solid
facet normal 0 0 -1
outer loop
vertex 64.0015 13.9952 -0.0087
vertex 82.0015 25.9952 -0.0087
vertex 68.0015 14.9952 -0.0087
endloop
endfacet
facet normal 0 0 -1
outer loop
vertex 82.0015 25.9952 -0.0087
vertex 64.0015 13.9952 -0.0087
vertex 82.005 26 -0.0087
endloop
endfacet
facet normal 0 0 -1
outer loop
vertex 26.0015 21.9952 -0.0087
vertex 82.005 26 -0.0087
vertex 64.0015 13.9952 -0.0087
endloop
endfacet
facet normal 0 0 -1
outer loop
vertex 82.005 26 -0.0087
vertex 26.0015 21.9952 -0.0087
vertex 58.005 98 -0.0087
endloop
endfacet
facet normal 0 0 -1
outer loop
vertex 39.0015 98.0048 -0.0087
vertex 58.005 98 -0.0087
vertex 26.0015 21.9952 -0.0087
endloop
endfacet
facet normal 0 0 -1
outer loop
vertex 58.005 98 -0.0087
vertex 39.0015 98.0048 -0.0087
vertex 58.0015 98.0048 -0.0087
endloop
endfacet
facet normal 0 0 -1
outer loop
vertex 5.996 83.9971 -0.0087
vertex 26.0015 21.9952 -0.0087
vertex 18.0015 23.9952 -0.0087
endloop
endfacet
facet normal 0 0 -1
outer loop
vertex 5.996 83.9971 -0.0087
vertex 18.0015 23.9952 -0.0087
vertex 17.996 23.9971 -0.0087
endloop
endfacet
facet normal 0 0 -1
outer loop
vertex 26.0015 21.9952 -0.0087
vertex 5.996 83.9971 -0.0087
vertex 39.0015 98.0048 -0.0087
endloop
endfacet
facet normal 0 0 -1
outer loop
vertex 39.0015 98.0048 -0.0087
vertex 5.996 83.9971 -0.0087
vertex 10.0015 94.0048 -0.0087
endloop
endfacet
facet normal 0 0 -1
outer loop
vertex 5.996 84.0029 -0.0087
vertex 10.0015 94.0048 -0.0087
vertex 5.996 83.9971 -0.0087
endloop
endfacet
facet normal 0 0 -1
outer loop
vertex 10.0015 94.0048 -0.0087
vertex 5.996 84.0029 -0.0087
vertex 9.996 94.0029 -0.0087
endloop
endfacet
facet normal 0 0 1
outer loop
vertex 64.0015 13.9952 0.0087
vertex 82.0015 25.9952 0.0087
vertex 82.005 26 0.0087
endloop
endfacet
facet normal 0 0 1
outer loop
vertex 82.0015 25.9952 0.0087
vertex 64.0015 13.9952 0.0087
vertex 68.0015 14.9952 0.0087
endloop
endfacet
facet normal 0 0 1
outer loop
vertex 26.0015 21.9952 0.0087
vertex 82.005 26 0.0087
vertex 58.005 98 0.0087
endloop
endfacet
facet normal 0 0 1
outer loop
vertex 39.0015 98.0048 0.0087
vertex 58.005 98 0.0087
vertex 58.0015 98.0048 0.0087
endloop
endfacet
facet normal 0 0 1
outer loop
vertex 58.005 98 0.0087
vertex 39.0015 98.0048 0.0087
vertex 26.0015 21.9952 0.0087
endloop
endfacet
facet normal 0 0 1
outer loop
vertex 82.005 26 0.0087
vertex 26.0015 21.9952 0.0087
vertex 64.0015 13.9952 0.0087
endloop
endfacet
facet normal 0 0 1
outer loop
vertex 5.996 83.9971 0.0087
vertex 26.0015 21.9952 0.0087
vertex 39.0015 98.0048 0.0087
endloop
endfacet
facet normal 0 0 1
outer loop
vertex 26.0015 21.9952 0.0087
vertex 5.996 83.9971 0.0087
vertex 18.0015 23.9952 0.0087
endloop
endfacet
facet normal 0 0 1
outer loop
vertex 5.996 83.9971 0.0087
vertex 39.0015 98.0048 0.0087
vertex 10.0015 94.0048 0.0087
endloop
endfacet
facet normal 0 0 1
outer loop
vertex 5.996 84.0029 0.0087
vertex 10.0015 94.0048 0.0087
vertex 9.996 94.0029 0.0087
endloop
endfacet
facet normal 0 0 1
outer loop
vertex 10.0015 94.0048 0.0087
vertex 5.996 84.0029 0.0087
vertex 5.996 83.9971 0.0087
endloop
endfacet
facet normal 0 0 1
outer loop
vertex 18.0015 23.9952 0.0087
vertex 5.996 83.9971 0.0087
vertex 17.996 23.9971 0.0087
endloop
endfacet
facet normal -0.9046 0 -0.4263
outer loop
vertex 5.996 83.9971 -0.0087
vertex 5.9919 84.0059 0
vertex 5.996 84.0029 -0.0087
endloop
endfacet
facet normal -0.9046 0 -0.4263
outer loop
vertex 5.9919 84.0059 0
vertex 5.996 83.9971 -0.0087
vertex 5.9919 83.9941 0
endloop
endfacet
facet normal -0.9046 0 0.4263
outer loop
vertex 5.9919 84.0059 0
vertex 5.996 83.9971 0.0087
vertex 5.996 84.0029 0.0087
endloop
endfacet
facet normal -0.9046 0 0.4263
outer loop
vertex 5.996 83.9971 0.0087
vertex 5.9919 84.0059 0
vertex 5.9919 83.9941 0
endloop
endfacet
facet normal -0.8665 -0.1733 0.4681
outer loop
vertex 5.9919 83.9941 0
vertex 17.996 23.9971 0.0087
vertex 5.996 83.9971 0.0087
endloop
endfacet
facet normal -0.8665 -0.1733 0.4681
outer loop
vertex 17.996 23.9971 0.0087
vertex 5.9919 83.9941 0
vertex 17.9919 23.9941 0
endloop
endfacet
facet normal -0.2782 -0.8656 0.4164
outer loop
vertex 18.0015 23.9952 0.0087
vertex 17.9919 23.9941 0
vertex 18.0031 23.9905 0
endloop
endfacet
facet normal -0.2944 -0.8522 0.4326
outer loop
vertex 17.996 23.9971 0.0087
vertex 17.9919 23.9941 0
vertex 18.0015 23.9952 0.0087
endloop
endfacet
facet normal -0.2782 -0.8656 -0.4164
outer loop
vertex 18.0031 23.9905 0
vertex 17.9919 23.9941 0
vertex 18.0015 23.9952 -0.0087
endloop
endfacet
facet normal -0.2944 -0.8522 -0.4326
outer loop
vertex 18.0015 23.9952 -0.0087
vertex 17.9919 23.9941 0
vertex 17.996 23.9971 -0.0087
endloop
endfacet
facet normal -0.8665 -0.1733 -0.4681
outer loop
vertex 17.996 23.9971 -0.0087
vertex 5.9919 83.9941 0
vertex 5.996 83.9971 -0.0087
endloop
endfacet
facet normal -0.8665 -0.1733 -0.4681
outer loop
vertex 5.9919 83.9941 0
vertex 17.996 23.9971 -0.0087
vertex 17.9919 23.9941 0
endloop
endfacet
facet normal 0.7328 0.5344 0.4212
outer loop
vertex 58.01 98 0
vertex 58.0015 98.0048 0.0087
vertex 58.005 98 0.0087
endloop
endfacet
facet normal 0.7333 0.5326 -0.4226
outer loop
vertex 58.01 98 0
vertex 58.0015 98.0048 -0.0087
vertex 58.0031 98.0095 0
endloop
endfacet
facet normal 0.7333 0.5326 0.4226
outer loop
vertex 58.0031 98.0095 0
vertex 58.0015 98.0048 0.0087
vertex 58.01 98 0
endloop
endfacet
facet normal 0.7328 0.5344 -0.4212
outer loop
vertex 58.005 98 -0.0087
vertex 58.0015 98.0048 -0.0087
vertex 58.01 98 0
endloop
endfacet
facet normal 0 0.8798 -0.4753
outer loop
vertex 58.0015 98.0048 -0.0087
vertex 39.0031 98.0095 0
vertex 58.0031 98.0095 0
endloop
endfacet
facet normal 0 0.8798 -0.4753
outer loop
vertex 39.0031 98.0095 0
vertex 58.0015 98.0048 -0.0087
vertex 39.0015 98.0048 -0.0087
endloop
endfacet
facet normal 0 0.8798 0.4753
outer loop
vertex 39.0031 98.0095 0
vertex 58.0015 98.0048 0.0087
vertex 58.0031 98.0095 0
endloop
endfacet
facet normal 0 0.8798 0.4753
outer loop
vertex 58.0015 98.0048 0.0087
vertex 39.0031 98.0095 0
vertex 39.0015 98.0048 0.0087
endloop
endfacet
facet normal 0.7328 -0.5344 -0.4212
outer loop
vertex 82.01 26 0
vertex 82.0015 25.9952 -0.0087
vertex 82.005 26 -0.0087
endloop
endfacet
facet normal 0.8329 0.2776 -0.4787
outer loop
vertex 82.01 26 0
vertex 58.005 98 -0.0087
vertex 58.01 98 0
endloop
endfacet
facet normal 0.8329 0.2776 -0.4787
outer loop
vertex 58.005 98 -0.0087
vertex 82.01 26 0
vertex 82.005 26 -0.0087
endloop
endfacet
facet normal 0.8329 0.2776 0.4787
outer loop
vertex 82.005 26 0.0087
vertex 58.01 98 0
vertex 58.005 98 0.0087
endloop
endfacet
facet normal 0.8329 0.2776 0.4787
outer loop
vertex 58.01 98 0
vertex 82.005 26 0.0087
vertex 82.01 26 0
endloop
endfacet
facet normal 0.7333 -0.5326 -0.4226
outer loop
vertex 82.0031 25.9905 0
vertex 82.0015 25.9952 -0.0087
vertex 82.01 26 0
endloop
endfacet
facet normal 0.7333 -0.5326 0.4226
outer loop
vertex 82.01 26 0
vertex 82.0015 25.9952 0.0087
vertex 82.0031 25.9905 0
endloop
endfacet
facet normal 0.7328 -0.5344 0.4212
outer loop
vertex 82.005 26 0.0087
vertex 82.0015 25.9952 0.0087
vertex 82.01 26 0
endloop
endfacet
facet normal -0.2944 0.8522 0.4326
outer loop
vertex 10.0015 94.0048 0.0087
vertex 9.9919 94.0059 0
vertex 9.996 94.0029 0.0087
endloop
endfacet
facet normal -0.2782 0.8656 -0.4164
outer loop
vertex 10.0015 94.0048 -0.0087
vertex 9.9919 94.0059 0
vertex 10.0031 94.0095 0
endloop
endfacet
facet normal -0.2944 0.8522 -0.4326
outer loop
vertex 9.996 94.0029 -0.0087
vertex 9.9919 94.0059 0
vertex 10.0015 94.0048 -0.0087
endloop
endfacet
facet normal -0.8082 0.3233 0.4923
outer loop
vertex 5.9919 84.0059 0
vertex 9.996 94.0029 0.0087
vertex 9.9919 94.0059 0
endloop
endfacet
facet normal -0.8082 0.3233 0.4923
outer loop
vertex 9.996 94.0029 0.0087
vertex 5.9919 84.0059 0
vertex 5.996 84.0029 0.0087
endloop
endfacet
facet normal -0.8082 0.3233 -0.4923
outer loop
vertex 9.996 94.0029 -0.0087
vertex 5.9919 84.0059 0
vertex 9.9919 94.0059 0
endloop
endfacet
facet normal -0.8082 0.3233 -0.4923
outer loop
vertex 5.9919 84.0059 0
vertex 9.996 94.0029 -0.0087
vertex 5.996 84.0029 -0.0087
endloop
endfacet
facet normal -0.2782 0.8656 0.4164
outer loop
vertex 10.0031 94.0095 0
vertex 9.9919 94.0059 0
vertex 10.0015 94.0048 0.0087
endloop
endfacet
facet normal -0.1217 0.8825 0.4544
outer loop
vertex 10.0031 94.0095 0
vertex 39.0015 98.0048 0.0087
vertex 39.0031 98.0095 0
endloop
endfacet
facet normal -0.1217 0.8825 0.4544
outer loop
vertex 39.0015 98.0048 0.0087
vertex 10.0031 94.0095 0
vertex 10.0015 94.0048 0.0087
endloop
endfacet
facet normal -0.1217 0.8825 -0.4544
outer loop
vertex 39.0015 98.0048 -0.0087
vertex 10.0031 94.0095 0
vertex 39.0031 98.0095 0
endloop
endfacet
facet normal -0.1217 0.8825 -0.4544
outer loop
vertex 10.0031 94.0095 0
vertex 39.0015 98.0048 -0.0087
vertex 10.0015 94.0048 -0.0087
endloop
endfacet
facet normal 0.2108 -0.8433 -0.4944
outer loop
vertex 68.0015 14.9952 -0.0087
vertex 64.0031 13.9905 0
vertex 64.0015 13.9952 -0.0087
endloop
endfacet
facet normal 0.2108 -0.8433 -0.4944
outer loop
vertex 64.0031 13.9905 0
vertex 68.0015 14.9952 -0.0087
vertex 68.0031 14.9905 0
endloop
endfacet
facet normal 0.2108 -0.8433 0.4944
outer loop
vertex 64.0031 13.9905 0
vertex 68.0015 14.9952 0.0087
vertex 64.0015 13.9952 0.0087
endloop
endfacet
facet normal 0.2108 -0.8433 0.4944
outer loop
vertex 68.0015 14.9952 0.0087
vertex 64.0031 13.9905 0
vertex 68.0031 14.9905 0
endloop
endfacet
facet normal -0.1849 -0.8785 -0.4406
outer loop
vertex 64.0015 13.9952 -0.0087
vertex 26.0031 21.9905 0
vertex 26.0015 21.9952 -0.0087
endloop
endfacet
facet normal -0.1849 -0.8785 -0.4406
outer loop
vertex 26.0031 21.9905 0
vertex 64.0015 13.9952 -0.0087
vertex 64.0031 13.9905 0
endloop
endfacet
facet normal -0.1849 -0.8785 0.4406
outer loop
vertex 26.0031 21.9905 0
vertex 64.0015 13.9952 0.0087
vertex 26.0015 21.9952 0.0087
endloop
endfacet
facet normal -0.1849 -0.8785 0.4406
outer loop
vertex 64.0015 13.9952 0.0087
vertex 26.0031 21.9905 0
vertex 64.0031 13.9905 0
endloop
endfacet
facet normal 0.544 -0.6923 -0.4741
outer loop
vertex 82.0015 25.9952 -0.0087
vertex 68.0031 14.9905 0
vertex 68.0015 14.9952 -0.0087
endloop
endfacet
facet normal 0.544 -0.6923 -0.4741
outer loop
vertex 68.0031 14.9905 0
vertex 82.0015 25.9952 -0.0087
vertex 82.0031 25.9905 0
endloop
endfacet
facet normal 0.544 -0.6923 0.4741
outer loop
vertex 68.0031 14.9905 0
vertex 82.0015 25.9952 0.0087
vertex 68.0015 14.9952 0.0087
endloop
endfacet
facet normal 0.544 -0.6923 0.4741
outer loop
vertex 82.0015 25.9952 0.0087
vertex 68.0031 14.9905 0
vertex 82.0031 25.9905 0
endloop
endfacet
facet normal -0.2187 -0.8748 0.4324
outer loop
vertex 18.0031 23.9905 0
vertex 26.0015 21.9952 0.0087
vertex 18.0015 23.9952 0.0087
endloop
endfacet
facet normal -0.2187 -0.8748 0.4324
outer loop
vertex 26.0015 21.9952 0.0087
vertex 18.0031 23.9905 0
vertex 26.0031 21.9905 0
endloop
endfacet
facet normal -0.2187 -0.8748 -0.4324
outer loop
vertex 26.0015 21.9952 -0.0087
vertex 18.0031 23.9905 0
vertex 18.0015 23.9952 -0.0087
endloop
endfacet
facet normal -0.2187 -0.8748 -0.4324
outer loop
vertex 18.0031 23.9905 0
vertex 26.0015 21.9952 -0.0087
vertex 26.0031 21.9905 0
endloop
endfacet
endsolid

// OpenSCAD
color([0.3519350680925015,0.6477014615427978,0.14125726454845833]) hull(){
    translate([18,58]) sphere(0.01);
    translate([22,90]) sphere(0.01);
    translate([44,55]) sphere(0.01);
}
color([0.23013900541024712,0.8285218163248013,0.9603761550286747]) hull(){
    translate([18,58]) sphere(0.01);
    translate([22,90]) sphere(0.01);
    translate([6,84]) sphere(0.01);
}
color([0.6050710034948523,0.017553655236826726,0.43262871278032167]) hull(){
    translate([18,58]) sphere(0.01);
    translate([44,55]) sphere(0.01);
    translate([44,47]) sphere(0.01);
}
color([0.2571490251669072,0.4480229944680496,0.14517873337393172]) hull(){
    translate([18,58]) sphere(0.01);
    translate([6,84]) sphere(0.01);
    translate([18,24]) sphere(0.01);
}
color([0.8405131005933094,0.9776834869331054,0.10300019528175153]) hull(){
    translate([18,58]) sphere(0.01);
    translate([18,24]) sphere(0.01);
    translate([44,47]) sphere(0.01);
}
color([0.998153073210626,0.8535026464000083,0.6855970549077809]) hull(){
    translate([58,98]) sphere(0.01);
    translate([50,93]) sphere(0.01);
    translate([44,55]) sphere(0.01);
}
color([0.7995005100691247,0.34047238184459006,0.1286635278612125]) hull(){
    translate([58,98]) sphere(0.01);
    translate([50,93]) sphere(0.01);
    translate([39,98]) sphere(0.01);
}
color([0.6020598448119898,0.9167847797194366,0.02081986636819022]) hull(){
    translate([58,98]) sphere(0.01);
    translate([44,55]) sphere(0.01);
    translate([82,26]) sphere(0.01);
}
color([0.9135118305629362,0.3823609034395232,0.42581309278619206]) hull(){
    translate([22,90]) sphere(0.01);
    translate([50,93]) sphere(0.01);
    translate([44,55]) sphere(0.01);
}
color([0.08967296065919184,0.0016857337534631478,0.31287848776698257]) hull(){
    translate([22,90]) sphere(0.01);
    translate([50,93]) sphere(0.01);
    translate([39,98]) sphere(0.01);
}
color([0.09731792302828757,0.364404074066101,0.8754307508322564]) hull(){
    translate([22,90]) sphere(0.01);
    translate([10,94]) sphere(0.01);
    translate([6,84]) sphere(0.01);
}
color([0.6967090939923642,0.5776053806129825,0.18685318159950626]) hull(){
    translate([22,90]) sphere(0.01);
    translate([10,94]) sphere(0.01);
    translate([39,98]) sphere(0.01);
}
color([0.9585806736472646,0.593334846568766,0.09927504601217696]) hull(){
    translate([44,55]) sphere(0.01);
    translate([58,33]) sphere(0.01);
    translate([82,26]) sphere(0.01);
}
color([0.19313665173925,0.6863688301261038,0.2093263356404984]) hull(){
    translate([44,55]) sphere(0.01);
    translate([58,33]) sphere(0.01);
    translate([44,47]) sphere(0.01);
}
color([0.2694340379225941,0.24598969558588324,0.16092298384524362]) hull(){
    translate([64,14]) sphere(0.01);
    translate([68,15]) sphere(0.01);
    translate([58,33]) sphere(0.01);
}
color([0.5102606956149307,0.431705445139412,0.38909399282504675]) hull(){
    translate([64,14]) sphere(0.01);
    translate([58,33]) sphere(0.01);
    translate([42,29]) sphere(0.01);
}
color([0.3194819673674283,0.6655357355223767,0.22692357675811492]) hull(){
    translate([64,14]) sphere(0.01);
    translate([42,29]) sphere(0.01);
    translate([26,22]) sphere(0.01);
}
color([0.9464906820257937,0.35776616524050997,0.9421064453260054]) hull(){
    translate([68,15]) sphere(0.01);
    translate([58,33]) sphere(0.01);
    translate([82,26]) sphere(0.01);
}
color([0.3792404853118415,0.27508202782836655,0.9368074710650367]) hull(){
    translate([58,33]) sphere(0.01);
    translate([42,29]) sphere(0.01);
    translate([44,47]) sphere(0.01);
}
color([0.7670397757471089,0.17483880300164423,0.7474114244696689]) hull(){
    translate([42,29]) sphere(0.01);
    translate([26,22]) sphere(0.01);
    translate([44,47]) sphere(0.01);
}
color([0.6015236368594579,0.5872808850844162,0.28390336255679416]) hull(){
    translate([26,22]) sphere(0.01);
    translate([18,24]) sphere(0.01);
    translate([44,47]) sphere(0.01);
}
